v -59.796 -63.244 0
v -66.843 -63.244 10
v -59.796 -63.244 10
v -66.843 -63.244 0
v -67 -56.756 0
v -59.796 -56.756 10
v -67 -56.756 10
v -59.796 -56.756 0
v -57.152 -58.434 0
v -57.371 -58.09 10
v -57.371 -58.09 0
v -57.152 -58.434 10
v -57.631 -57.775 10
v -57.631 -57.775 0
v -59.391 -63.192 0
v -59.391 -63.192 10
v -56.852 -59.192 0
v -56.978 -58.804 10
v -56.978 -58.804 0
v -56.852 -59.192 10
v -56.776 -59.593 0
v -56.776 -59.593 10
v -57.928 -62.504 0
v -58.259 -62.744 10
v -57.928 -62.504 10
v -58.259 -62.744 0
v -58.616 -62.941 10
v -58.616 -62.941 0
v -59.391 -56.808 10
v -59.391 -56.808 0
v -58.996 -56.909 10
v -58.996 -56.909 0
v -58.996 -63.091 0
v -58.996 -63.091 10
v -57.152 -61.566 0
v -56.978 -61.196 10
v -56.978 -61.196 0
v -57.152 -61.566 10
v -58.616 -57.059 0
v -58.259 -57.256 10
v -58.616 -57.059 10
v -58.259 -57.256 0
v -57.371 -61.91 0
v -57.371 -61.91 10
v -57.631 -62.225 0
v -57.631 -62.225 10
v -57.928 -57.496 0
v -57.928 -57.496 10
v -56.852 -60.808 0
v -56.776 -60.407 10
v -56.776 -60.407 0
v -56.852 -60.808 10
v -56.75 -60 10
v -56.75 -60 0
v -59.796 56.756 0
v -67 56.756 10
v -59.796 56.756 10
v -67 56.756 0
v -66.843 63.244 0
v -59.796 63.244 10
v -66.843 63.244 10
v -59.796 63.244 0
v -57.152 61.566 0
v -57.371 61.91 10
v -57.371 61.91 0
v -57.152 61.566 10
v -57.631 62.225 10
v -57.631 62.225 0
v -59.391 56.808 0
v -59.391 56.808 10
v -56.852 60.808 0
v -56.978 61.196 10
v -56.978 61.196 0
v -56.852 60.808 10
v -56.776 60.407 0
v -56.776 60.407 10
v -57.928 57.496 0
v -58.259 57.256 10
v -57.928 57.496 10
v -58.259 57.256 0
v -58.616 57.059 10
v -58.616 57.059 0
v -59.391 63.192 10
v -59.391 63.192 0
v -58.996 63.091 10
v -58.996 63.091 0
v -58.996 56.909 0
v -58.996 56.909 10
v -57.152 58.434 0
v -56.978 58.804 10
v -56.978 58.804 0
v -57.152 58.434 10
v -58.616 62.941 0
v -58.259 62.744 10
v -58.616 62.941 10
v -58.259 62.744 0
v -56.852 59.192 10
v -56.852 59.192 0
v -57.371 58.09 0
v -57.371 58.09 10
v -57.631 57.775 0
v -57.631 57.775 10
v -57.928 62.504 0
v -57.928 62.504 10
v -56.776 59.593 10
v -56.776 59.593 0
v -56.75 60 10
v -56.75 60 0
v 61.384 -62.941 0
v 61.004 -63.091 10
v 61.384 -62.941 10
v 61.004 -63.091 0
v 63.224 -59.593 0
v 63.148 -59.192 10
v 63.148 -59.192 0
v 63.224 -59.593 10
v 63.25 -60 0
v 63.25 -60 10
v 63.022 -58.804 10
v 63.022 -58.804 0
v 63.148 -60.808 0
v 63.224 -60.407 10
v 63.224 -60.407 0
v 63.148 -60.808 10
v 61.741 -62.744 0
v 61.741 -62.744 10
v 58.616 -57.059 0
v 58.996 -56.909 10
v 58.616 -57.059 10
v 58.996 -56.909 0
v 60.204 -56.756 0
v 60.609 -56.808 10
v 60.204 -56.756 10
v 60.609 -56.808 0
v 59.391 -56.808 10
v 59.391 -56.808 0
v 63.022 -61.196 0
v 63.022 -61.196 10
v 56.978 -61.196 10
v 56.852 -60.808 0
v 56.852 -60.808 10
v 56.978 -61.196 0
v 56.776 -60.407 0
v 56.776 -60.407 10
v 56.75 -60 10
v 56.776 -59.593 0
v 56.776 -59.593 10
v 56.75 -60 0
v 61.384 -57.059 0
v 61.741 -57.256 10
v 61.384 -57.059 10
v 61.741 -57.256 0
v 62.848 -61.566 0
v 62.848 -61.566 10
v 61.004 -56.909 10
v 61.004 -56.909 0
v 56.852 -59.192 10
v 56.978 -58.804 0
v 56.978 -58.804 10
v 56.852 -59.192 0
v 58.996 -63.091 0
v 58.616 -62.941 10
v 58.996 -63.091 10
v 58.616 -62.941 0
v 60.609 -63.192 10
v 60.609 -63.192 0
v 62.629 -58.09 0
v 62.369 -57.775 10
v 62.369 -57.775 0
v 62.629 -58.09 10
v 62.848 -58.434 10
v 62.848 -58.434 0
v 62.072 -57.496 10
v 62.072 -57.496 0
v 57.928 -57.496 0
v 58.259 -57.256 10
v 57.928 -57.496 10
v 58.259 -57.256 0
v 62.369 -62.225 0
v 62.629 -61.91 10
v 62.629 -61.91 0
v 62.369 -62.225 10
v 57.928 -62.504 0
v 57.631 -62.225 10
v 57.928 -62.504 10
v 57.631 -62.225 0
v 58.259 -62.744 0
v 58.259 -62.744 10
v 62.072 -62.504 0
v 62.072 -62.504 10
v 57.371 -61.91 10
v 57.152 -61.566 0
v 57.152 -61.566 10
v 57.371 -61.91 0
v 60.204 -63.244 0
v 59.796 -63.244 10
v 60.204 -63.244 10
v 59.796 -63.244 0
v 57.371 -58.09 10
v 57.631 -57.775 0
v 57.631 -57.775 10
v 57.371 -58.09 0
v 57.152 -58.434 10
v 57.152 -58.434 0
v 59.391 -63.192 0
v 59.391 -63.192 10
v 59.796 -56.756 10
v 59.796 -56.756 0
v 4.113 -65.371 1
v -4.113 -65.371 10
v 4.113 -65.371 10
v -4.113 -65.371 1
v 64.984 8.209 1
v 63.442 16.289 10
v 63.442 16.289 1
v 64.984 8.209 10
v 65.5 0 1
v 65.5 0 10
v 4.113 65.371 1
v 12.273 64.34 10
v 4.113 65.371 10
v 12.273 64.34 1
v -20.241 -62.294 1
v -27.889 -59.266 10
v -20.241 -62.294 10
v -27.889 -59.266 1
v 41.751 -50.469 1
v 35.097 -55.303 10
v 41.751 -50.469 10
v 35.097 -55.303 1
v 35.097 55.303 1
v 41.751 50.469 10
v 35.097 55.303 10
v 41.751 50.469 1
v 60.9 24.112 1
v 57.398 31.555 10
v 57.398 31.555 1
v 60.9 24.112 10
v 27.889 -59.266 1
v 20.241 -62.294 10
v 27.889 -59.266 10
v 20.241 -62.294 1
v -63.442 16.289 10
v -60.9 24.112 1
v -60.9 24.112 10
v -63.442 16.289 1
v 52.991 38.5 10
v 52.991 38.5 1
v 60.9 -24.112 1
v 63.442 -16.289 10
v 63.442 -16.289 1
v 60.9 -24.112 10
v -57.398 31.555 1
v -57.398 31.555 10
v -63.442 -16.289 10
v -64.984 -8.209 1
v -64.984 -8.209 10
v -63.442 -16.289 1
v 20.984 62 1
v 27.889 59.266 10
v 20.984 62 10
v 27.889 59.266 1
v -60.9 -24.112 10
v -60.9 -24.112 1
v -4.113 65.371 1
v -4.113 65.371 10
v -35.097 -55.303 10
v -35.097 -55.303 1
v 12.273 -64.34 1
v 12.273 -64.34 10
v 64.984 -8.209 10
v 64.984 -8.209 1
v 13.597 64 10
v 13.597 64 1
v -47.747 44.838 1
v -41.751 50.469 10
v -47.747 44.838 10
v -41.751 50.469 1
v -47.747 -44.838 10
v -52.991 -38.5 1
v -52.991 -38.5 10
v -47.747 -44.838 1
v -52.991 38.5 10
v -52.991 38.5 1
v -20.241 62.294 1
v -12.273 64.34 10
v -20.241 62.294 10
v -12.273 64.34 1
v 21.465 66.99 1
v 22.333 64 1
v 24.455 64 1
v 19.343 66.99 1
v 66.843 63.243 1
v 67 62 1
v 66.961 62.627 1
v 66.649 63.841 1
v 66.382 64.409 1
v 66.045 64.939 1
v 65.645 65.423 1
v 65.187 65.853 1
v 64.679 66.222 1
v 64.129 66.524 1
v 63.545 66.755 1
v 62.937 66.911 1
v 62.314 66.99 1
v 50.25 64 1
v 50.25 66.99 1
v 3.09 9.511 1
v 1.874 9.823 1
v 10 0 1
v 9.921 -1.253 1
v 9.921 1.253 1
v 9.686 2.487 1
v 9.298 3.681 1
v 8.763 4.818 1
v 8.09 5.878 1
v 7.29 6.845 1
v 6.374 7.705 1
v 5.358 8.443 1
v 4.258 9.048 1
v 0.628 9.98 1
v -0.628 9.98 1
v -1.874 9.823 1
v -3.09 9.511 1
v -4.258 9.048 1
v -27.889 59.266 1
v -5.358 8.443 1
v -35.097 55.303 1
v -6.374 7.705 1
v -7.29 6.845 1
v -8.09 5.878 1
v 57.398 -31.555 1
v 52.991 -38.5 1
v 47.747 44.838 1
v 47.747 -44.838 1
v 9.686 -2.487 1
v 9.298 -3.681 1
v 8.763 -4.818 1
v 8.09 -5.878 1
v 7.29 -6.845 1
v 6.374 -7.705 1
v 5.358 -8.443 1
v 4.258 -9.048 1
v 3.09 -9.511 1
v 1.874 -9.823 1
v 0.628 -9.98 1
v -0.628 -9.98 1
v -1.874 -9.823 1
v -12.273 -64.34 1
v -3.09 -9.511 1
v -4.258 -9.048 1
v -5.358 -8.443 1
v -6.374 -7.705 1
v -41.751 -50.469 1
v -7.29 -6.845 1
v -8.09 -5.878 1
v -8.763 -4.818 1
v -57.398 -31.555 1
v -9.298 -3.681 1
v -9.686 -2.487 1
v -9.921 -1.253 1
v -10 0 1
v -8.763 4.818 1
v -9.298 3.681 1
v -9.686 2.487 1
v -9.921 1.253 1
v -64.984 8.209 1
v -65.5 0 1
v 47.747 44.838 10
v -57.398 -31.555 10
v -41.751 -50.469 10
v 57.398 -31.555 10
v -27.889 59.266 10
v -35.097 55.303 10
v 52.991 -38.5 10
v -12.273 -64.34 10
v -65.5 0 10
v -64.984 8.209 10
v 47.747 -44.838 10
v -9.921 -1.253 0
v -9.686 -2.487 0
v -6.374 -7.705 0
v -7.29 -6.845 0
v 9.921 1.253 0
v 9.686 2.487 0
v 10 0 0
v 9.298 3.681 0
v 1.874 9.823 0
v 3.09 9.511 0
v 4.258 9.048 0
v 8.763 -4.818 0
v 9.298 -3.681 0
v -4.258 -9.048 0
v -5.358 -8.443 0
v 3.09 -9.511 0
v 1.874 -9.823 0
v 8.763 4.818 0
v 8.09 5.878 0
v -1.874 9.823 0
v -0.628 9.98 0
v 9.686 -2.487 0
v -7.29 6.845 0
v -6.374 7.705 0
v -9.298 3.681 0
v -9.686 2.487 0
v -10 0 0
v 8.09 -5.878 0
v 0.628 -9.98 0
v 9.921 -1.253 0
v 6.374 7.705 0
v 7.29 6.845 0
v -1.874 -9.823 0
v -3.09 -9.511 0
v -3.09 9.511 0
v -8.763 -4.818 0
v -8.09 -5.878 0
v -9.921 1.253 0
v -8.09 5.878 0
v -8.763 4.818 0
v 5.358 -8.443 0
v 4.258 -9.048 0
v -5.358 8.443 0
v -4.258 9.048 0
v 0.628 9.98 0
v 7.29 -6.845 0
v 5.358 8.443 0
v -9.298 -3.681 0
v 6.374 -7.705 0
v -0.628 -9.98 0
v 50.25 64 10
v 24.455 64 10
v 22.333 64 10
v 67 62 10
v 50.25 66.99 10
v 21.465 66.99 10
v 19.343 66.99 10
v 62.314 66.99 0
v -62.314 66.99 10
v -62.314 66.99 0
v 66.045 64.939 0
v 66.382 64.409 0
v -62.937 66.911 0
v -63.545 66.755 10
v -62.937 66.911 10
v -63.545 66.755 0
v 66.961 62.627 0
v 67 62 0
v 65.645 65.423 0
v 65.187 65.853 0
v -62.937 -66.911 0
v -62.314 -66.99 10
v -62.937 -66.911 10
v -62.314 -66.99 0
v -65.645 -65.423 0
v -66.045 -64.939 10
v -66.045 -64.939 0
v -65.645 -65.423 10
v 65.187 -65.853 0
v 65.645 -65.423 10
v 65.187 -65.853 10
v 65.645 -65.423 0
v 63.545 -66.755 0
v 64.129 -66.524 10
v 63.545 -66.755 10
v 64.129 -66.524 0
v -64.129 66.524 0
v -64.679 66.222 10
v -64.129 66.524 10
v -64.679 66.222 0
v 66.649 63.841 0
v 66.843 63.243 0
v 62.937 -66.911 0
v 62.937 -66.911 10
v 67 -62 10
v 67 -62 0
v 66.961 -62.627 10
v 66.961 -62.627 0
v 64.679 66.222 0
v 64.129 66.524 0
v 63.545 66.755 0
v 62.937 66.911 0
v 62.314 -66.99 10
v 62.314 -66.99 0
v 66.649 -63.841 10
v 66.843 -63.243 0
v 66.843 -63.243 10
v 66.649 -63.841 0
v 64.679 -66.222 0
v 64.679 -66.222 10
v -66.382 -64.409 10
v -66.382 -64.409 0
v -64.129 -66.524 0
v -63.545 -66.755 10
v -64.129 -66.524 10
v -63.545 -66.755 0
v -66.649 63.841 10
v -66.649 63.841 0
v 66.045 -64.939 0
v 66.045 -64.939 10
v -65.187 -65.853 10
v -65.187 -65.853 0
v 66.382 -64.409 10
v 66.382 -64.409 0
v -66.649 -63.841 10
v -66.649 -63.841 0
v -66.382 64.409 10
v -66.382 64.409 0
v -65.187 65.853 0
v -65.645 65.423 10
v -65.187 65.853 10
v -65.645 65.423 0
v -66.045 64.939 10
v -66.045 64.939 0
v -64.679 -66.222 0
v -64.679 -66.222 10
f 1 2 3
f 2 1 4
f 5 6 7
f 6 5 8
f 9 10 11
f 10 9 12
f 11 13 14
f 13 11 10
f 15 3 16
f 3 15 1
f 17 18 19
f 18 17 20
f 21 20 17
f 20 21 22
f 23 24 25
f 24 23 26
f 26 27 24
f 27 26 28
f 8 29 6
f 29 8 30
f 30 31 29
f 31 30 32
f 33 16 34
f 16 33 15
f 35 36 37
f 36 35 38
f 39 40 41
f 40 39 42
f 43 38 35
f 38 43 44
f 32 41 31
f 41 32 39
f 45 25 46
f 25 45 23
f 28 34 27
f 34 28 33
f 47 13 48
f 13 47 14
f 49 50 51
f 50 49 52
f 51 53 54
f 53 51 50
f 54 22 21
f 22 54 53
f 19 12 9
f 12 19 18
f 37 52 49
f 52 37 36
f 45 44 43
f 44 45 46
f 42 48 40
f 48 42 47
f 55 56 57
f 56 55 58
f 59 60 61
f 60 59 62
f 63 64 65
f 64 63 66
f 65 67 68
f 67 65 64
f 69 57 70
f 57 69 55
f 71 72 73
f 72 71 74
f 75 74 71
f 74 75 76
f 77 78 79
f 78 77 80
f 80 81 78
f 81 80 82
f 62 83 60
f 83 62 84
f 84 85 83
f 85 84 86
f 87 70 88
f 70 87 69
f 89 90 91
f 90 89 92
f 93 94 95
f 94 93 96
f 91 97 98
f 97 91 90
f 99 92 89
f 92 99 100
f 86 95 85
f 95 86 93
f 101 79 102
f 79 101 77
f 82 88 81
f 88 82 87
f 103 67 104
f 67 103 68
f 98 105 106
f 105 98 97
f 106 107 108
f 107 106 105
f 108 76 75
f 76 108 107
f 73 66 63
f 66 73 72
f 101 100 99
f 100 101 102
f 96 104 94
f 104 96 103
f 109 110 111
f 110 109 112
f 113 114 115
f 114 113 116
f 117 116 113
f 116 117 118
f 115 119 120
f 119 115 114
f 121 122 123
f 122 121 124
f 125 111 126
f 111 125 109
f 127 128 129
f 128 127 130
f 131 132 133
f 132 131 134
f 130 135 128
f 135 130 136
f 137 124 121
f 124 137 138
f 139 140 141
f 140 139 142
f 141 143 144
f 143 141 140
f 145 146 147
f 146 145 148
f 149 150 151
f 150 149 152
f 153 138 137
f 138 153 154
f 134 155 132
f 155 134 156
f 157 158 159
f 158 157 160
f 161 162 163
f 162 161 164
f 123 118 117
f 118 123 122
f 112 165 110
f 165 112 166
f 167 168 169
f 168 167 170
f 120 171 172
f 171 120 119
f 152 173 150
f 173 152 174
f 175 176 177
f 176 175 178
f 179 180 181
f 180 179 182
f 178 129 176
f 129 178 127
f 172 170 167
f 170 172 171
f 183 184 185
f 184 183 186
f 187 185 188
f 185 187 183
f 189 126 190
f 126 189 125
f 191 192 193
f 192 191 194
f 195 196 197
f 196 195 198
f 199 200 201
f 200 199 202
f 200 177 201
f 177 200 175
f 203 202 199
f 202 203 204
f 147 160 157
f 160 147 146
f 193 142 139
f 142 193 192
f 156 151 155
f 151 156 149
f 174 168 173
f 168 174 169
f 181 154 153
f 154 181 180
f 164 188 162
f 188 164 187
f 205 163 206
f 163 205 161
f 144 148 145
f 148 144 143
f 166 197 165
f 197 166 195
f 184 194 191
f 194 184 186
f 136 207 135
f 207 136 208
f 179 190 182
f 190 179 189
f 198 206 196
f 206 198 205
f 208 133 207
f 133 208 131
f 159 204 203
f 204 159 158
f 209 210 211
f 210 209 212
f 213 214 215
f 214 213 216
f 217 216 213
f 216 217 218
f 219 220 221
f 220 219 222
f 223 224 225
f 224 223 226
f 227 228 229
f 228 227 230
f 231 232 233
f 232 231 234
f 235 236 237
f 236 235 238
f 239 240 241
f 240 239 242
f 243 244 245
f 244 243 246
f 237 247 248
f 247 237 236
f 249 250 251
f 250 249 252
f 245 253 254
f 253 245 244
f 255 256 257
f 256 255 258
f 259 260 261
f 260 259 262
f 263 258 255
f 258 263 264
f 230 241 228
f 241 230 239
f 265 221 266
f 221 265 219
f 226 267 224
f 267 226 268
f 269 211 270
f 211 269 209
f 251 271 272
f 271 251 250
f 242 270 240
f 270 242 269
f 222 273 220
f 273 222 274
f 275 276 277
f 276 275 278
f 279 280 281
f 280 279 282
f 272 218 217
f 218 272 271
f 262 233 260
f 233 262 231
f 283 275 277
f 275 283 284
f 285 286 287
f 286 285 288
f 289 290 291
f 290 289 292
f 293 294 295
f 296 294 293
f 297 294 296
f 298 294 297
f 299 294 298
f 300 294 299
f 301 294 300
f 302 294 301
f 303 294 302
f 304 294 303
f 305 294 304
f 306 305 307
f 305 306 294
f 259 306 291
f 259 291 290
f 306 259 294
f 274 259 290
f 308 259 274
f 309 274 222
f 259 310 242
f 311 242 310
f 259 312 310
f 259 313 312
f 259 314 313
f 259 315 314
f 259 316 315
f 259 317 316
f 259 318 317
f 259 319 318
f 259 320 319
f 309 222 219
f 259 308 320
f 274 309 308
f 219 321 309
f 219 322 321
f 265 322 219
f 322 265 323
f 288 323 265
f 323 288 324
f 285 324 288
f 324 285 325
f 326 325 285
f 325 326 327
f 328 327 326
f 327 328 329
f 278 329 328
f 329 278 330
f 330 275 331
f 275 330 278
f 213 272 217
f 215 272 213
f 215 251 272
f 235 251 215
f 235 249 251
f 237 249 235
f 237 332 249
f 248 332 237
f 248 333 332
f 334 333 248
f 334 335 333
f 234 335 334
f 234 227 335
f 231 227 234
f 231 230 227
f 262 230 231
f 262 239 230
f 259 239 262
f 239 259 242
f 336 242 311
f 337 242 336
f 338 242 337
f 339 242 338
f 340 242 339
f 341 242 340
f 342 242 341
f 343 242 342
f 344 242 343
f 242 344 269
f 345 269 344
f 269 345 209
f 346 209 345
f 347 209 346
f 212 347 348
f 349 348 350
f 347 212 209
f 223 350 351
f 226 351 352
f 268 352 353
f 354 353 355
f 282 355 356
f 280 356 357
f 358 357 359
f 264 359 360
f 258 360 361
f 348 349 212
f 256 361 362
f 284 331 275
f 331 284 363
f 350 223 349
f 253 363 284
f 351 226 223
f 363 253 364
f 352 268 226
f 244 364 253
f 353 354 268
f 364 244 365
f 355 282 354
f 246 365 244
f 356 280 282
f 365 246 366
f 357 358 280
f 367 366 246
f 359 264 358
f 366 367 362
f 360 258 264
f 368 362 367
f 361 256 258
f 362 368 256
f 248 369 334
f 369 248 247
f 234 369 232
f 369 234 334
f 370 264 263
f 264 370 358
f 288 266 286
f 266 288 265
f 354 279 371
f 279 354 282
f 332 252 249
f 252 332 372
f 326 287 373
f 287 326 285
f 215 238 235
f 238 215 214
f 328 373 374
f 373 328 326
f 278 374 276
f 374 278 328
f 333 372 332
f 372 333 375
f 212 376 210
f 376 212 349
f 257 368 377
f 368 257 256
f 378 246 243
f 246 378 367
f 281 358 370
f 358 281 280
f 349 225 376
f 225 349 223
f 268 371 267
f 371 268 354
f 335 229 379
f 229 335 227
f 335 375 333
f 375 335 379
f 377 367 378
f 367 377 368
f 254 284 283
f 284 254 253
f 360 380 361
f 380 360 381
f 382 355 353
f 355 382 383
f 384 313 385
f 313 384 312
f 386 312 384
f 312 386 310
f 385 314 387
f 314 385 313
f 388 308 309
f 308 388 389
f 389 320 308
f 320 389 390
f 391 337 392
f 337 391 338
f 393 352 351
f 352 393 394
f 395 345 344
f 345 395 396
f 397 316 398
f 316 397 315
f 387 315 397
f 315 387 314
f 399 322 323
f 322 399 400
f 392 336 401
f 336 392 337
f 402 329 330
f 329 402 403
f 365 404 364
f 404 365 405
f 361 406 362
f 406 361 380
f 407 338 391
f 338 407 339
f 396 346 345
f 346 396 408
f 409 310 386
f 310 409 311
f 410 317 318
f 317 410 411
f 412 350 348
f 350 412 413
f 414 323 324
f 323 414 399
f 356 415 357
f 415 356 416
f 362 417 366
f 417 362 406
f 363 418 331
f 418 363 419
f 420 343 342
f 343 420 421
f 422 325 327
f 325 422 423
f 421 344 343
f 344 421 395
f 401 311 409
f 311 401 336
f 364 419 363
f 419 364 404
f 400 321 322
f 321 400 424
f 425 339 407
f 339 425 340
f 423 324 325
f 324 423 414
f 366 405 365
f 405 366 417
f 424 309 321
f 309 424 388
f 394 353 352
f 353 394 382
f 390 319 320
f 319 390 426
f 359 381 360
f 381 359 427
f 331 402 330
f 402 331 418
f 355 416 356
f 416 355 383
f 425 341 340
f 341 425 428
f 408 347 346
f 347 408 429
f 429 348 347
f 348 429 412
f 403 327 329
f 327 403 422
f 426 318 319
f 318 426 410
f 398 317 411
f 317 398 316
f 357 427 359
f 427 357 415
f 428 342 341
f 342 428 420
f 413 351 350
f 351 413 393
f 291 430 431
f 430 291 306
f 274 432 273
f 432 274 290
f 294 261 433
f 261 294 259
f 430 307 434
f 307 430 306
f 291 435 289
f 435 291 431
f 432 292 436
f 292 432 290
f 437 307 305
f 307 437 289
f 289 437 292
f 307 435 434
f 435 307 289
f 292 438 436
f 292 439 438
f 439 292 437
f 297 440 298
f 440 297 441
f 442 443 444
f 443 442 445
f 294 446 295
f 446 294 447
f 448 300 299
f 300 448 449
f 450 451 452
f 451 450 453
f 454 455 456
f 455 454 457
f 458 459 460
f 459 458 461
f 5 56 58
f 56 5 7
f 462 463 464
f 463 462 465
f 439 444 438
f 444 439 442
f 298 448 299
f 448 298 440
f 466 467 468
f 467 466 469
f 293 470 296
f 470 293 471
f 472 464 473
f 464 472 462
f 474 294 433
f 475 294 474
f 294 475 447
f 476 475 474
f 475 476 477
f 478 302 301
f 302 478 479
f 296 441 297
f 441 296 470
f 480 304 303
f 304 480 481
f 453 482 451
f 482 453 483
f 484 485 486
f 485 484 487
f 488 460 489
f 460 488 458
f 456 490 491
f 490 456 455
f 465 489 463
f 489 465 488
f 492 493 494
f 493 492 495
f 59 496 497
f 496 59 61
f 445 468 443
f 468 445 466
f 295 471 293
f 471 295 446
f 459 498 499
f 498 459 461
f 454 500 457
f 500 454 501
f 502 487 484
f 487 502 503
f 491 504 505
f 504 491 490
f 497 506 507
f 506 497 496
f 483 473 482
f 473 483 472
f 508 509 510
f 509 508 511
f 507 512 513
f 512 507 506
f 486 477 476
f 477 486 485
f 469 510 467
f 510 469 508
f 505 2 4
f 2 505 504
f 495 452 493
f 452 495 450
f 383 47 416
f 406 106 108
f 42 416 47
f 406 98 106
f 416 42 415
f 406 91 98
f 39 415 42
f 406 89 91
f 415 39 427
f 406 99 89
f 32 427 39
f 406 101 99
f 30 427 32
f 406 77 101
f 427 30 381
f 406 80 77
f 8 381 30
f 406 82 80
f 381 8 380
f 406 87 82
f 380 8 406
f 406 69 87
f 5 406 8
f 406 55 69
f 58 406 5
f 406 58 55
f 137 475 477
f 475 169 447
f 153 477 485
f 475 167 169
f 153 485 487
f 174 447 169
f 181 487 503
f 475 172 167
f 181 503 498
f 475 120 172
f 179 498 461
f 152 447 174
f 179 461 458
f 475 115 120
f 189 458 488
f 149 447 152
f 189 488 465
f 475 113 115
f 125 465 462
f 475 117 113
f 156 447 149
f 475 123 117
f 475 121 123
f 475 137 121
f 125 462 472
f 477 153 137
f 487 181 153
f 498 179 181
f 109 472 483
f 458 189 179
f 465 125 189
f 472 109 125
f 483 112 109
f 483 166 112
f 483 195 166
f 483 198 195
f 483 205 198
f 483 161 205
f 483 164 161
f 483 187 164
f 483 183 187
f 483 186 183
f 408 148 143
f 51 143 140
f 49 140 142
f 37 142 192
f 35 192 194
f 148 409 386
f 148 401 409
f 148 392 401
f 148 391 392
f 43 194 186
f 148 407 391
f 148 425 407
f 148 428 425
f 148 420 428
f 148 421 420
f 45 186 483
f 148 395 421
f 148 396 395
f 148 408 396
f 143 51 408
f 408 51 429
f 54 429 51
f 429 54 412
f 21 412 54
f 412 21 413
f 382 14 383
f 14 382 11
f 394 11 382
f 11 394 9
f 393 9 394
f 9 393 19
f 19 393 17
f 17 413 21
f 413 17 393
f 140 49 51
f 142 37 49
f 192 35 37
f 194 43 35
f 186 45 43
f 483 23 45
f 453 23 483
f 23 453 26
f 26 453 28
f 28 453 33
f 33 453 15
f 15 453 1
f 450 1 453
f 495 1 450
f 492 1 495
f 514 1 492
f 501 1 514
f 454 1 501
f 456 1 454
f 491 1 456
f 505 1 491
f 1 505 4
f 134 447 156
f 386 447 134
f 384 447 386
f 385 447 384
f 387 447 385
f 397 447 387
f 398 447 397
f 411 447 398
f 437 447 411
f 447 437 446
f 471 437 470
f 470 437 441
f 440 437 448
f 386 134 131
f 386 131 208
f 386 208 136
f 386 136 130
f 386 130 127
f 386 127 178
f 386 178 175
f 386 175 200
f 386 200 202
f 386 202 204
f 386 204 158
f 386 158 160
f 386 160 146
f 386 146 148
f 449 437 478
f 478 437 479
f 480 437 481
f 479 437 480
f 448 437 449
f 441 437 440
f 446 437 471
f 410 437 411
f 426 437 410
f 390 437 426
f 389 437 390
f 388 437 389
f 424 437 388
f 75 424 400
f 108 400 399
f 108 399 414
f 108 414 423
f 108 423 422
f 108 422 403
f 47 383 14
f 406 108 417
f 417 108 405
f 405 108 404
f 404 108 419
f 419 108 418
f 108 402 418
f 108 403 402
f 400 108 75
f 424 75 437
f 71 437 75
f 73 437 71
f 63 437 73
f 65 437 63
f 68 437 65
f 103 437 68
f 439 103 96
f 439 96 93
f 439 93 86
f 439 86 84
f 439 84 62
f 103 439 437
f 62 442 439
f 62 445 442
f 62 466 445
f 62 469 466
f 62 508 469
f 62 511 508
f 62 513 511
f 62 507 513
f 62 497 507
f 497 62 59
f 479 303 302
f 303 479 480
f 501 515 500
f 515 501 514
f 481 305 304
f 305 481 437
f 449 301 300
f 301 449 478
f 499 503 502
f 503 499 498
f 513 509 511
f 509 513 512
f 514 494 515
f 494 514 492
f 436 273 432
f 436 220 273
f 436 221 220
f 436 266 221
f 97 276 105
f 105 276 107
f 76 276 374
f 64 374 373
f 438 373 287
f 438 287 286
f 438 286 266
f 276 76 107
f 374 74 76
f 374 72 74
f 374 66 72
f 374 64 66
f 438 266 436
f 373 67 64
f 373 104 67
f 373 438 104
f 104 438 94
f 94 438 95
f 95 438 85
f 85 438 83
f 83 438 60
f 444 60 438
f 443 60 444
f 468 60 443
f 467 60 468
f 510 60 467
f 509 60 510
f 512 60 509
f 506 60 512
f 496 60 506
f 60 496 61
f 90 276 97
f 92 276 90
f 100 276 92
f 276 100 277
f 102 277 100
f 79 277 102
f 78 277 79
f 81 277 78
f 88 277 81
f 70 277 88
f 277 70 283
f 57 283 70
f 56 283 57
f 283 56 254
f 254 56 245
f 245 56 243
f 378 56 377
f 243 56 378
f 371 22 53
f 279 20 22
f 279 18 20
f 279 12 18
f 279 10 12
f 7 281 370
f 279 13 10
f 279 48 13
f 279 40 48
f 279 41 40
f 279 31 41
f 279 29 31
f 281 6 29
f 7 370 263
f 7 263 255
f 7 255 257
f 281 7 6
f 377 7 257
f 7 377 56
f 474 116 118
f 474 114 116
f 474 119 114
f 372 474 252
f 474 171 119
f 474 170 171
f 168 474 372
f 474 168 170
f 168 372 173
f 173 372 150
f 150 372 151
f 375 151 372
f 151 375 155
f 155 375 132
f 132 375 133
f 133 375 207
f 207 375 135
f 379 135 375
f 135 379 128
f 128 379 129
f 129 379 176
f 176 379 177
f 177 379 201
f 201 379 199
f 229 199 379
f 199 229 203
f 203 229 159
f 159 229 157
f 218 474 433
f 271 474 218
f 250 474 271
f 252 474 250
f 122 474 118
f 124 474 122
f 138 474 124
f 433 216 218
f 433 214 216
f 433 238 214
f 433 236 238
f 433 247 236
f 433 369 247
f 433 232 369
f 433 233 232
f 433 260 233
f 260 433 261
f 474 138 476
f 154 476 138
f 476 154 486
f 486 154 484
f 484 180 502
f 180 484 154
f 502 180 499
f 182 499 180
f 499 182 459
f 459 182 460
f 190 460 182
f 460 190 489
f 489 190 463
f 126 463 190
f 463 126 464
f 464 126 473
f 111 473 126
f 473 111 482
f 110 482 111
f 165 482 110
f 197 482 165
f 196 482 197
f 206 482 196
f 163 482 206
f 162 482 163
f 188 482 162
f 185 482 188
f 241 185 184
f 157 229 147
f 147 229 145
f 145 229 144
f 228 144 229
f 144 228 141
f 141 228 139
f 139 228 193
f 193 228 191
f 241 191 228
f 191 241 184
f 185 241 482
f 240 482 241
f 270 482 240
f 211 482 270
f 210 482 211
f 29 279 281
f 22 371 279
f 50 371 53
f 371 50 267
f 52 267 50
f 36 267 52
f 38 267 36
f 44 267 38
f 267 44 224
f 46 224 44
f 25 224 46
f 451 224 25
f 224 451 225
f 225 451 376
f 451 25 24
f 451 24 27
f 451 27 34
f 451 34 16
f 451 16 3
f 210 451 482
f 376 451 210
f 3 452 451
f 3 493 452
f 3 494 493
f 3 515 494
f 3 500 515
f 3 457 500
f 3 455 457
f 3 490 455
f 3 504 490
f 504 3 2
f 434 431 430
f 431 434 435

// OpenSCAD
$fn = 50;


difference() {
	union() {
		translate(v = [0, 0, 0]) {
			rotate(a = [0, 0, 0]) {
				hull() {
					translate(v = [-62.0000000000, 62.0000000000, 0]) {
						rotate(a = [0, 0, 0]) {
							translate(v = [0, 0, 0]) {
								rotate(a = [0, 0, 0]) {
									cylinder(h = 10, r = 5);
								}
							}
						}
					}
					translate(v = [62.0000000000, 62.0000000000, 0]) {
						rotate(a = [0, 0, 0]) {
							translate(v = [0, 0, 0]) {
								rotate(a = [0, 0, 0]) {
									cylinder(h = 10, r = 5);
								}
							}
						}
					}
					translate(v = [-62.0000000000, -62.0000000000, 0]) {
						rotate(a = [0, 0, 0]) {
							translate(v = [0, 0, 0]) {
								rotate(a = [0, 0, 0]) {
									cylinder(h = 10, r = 5);
								}
							}
						}
					}
					translate(v = [62.0000000000, -62.0000000000, 0]) {
						rotate(a = [0, 0, 0]) {
							translate(v = [0, 0, 0]) {
								rotate(a = [0, 0, 0]) {
									cylinder(h = 10, r = 5);
								}
							}
						}
					}
				}
			}
		}
	}
	union() {
		translate(v = [-67.5000000000, -60.0000000000, -125]) {
			rotate(a = [0, 0, 0]) {
				hull() {
					translate(v = [7.5000000000, 0, 0]) {
						rotate(a = [0, 0, 0]) {
							translate(v = [0, 0, 0]) {
								rotate(a = [0, 0, 0]) {
									cylinder(h = 250, r = 3.2500000000);
								}
							}
						}
					}
					translate(v = [-7.5000000000, 0, 0]) {
						rotate(a = [0, 0, 0]) {
							translate(v = [0, 0, 0]) {
								rotate(a = [0, 0, 0]) {
									cylinder(h = 250, r = 3.2500000000);
								}
							}
						}
					}
				}
			}
		}
		translate(v = [-67.5000000000, 60.0000000000, -125]) {
			rotate(a = [0, 0, 0]) {
				hull() {
					translate(v = [7.5000000000, 0, 0]) {
						rotate(a = [0, 0, 0]) {
							translate(v = [0, 0, 0]) {
								rotate(a = [0, 0, 0]) {
									cylinder(h = 250, r = 3.2500000000);
								}
							}
						}
					}
					translate(v = [-7.5000000000, 0, 0]) {
						rotate(a = [0, 0, 0]) {
							translate(v = [0, 0, 0]) {
								rotate(a = [0, 0, 0]) {
									cylinder(h = 250, r = 3.2500000000);
								}
							}
						}
					}
				}
			}
		}
		translate(v = [60.0000000000, -60.0000000000, -125.0000000000]) {
			rotate(a = [0, 0, 0]) {
				cylinder(h = 250, r = 3.2500000000);
			}
		}
		translate(v = [0, 0, 1.0000000000]) {
			rotate(a = [0, 0, 0]) {
				cylinder(h = 12, r = 65.5000000000);
			}
		}
		translate(v = [0, 0, -5.0000000000]) {
			rotate(a = [0, 0, 0]) {
				cylinder(h = 10, r = 10.0000000000);
			}
		}
		translate(v = [0.0000000000, 62.0000000000, 1]) {
			rotate(a = [0, 0, 0]) {
				cube(size = [67.0000000000, 2, 12]);
			}
		}
		translate(v = [50.2500000000, 62.0000000000, 1]) {
			rotate(a = [0, 0, 0]) {
				cube(size = [16.7500000000, 5, 12]);
			}
		}
		translate(v = [18.5833333333, 67.7500000000, 1]) {
			rotate(a = [0, 0, -45]) {
				cube(size = [7.5000000000, 1.5000000000, 12]);
			}
		}
	}
}
